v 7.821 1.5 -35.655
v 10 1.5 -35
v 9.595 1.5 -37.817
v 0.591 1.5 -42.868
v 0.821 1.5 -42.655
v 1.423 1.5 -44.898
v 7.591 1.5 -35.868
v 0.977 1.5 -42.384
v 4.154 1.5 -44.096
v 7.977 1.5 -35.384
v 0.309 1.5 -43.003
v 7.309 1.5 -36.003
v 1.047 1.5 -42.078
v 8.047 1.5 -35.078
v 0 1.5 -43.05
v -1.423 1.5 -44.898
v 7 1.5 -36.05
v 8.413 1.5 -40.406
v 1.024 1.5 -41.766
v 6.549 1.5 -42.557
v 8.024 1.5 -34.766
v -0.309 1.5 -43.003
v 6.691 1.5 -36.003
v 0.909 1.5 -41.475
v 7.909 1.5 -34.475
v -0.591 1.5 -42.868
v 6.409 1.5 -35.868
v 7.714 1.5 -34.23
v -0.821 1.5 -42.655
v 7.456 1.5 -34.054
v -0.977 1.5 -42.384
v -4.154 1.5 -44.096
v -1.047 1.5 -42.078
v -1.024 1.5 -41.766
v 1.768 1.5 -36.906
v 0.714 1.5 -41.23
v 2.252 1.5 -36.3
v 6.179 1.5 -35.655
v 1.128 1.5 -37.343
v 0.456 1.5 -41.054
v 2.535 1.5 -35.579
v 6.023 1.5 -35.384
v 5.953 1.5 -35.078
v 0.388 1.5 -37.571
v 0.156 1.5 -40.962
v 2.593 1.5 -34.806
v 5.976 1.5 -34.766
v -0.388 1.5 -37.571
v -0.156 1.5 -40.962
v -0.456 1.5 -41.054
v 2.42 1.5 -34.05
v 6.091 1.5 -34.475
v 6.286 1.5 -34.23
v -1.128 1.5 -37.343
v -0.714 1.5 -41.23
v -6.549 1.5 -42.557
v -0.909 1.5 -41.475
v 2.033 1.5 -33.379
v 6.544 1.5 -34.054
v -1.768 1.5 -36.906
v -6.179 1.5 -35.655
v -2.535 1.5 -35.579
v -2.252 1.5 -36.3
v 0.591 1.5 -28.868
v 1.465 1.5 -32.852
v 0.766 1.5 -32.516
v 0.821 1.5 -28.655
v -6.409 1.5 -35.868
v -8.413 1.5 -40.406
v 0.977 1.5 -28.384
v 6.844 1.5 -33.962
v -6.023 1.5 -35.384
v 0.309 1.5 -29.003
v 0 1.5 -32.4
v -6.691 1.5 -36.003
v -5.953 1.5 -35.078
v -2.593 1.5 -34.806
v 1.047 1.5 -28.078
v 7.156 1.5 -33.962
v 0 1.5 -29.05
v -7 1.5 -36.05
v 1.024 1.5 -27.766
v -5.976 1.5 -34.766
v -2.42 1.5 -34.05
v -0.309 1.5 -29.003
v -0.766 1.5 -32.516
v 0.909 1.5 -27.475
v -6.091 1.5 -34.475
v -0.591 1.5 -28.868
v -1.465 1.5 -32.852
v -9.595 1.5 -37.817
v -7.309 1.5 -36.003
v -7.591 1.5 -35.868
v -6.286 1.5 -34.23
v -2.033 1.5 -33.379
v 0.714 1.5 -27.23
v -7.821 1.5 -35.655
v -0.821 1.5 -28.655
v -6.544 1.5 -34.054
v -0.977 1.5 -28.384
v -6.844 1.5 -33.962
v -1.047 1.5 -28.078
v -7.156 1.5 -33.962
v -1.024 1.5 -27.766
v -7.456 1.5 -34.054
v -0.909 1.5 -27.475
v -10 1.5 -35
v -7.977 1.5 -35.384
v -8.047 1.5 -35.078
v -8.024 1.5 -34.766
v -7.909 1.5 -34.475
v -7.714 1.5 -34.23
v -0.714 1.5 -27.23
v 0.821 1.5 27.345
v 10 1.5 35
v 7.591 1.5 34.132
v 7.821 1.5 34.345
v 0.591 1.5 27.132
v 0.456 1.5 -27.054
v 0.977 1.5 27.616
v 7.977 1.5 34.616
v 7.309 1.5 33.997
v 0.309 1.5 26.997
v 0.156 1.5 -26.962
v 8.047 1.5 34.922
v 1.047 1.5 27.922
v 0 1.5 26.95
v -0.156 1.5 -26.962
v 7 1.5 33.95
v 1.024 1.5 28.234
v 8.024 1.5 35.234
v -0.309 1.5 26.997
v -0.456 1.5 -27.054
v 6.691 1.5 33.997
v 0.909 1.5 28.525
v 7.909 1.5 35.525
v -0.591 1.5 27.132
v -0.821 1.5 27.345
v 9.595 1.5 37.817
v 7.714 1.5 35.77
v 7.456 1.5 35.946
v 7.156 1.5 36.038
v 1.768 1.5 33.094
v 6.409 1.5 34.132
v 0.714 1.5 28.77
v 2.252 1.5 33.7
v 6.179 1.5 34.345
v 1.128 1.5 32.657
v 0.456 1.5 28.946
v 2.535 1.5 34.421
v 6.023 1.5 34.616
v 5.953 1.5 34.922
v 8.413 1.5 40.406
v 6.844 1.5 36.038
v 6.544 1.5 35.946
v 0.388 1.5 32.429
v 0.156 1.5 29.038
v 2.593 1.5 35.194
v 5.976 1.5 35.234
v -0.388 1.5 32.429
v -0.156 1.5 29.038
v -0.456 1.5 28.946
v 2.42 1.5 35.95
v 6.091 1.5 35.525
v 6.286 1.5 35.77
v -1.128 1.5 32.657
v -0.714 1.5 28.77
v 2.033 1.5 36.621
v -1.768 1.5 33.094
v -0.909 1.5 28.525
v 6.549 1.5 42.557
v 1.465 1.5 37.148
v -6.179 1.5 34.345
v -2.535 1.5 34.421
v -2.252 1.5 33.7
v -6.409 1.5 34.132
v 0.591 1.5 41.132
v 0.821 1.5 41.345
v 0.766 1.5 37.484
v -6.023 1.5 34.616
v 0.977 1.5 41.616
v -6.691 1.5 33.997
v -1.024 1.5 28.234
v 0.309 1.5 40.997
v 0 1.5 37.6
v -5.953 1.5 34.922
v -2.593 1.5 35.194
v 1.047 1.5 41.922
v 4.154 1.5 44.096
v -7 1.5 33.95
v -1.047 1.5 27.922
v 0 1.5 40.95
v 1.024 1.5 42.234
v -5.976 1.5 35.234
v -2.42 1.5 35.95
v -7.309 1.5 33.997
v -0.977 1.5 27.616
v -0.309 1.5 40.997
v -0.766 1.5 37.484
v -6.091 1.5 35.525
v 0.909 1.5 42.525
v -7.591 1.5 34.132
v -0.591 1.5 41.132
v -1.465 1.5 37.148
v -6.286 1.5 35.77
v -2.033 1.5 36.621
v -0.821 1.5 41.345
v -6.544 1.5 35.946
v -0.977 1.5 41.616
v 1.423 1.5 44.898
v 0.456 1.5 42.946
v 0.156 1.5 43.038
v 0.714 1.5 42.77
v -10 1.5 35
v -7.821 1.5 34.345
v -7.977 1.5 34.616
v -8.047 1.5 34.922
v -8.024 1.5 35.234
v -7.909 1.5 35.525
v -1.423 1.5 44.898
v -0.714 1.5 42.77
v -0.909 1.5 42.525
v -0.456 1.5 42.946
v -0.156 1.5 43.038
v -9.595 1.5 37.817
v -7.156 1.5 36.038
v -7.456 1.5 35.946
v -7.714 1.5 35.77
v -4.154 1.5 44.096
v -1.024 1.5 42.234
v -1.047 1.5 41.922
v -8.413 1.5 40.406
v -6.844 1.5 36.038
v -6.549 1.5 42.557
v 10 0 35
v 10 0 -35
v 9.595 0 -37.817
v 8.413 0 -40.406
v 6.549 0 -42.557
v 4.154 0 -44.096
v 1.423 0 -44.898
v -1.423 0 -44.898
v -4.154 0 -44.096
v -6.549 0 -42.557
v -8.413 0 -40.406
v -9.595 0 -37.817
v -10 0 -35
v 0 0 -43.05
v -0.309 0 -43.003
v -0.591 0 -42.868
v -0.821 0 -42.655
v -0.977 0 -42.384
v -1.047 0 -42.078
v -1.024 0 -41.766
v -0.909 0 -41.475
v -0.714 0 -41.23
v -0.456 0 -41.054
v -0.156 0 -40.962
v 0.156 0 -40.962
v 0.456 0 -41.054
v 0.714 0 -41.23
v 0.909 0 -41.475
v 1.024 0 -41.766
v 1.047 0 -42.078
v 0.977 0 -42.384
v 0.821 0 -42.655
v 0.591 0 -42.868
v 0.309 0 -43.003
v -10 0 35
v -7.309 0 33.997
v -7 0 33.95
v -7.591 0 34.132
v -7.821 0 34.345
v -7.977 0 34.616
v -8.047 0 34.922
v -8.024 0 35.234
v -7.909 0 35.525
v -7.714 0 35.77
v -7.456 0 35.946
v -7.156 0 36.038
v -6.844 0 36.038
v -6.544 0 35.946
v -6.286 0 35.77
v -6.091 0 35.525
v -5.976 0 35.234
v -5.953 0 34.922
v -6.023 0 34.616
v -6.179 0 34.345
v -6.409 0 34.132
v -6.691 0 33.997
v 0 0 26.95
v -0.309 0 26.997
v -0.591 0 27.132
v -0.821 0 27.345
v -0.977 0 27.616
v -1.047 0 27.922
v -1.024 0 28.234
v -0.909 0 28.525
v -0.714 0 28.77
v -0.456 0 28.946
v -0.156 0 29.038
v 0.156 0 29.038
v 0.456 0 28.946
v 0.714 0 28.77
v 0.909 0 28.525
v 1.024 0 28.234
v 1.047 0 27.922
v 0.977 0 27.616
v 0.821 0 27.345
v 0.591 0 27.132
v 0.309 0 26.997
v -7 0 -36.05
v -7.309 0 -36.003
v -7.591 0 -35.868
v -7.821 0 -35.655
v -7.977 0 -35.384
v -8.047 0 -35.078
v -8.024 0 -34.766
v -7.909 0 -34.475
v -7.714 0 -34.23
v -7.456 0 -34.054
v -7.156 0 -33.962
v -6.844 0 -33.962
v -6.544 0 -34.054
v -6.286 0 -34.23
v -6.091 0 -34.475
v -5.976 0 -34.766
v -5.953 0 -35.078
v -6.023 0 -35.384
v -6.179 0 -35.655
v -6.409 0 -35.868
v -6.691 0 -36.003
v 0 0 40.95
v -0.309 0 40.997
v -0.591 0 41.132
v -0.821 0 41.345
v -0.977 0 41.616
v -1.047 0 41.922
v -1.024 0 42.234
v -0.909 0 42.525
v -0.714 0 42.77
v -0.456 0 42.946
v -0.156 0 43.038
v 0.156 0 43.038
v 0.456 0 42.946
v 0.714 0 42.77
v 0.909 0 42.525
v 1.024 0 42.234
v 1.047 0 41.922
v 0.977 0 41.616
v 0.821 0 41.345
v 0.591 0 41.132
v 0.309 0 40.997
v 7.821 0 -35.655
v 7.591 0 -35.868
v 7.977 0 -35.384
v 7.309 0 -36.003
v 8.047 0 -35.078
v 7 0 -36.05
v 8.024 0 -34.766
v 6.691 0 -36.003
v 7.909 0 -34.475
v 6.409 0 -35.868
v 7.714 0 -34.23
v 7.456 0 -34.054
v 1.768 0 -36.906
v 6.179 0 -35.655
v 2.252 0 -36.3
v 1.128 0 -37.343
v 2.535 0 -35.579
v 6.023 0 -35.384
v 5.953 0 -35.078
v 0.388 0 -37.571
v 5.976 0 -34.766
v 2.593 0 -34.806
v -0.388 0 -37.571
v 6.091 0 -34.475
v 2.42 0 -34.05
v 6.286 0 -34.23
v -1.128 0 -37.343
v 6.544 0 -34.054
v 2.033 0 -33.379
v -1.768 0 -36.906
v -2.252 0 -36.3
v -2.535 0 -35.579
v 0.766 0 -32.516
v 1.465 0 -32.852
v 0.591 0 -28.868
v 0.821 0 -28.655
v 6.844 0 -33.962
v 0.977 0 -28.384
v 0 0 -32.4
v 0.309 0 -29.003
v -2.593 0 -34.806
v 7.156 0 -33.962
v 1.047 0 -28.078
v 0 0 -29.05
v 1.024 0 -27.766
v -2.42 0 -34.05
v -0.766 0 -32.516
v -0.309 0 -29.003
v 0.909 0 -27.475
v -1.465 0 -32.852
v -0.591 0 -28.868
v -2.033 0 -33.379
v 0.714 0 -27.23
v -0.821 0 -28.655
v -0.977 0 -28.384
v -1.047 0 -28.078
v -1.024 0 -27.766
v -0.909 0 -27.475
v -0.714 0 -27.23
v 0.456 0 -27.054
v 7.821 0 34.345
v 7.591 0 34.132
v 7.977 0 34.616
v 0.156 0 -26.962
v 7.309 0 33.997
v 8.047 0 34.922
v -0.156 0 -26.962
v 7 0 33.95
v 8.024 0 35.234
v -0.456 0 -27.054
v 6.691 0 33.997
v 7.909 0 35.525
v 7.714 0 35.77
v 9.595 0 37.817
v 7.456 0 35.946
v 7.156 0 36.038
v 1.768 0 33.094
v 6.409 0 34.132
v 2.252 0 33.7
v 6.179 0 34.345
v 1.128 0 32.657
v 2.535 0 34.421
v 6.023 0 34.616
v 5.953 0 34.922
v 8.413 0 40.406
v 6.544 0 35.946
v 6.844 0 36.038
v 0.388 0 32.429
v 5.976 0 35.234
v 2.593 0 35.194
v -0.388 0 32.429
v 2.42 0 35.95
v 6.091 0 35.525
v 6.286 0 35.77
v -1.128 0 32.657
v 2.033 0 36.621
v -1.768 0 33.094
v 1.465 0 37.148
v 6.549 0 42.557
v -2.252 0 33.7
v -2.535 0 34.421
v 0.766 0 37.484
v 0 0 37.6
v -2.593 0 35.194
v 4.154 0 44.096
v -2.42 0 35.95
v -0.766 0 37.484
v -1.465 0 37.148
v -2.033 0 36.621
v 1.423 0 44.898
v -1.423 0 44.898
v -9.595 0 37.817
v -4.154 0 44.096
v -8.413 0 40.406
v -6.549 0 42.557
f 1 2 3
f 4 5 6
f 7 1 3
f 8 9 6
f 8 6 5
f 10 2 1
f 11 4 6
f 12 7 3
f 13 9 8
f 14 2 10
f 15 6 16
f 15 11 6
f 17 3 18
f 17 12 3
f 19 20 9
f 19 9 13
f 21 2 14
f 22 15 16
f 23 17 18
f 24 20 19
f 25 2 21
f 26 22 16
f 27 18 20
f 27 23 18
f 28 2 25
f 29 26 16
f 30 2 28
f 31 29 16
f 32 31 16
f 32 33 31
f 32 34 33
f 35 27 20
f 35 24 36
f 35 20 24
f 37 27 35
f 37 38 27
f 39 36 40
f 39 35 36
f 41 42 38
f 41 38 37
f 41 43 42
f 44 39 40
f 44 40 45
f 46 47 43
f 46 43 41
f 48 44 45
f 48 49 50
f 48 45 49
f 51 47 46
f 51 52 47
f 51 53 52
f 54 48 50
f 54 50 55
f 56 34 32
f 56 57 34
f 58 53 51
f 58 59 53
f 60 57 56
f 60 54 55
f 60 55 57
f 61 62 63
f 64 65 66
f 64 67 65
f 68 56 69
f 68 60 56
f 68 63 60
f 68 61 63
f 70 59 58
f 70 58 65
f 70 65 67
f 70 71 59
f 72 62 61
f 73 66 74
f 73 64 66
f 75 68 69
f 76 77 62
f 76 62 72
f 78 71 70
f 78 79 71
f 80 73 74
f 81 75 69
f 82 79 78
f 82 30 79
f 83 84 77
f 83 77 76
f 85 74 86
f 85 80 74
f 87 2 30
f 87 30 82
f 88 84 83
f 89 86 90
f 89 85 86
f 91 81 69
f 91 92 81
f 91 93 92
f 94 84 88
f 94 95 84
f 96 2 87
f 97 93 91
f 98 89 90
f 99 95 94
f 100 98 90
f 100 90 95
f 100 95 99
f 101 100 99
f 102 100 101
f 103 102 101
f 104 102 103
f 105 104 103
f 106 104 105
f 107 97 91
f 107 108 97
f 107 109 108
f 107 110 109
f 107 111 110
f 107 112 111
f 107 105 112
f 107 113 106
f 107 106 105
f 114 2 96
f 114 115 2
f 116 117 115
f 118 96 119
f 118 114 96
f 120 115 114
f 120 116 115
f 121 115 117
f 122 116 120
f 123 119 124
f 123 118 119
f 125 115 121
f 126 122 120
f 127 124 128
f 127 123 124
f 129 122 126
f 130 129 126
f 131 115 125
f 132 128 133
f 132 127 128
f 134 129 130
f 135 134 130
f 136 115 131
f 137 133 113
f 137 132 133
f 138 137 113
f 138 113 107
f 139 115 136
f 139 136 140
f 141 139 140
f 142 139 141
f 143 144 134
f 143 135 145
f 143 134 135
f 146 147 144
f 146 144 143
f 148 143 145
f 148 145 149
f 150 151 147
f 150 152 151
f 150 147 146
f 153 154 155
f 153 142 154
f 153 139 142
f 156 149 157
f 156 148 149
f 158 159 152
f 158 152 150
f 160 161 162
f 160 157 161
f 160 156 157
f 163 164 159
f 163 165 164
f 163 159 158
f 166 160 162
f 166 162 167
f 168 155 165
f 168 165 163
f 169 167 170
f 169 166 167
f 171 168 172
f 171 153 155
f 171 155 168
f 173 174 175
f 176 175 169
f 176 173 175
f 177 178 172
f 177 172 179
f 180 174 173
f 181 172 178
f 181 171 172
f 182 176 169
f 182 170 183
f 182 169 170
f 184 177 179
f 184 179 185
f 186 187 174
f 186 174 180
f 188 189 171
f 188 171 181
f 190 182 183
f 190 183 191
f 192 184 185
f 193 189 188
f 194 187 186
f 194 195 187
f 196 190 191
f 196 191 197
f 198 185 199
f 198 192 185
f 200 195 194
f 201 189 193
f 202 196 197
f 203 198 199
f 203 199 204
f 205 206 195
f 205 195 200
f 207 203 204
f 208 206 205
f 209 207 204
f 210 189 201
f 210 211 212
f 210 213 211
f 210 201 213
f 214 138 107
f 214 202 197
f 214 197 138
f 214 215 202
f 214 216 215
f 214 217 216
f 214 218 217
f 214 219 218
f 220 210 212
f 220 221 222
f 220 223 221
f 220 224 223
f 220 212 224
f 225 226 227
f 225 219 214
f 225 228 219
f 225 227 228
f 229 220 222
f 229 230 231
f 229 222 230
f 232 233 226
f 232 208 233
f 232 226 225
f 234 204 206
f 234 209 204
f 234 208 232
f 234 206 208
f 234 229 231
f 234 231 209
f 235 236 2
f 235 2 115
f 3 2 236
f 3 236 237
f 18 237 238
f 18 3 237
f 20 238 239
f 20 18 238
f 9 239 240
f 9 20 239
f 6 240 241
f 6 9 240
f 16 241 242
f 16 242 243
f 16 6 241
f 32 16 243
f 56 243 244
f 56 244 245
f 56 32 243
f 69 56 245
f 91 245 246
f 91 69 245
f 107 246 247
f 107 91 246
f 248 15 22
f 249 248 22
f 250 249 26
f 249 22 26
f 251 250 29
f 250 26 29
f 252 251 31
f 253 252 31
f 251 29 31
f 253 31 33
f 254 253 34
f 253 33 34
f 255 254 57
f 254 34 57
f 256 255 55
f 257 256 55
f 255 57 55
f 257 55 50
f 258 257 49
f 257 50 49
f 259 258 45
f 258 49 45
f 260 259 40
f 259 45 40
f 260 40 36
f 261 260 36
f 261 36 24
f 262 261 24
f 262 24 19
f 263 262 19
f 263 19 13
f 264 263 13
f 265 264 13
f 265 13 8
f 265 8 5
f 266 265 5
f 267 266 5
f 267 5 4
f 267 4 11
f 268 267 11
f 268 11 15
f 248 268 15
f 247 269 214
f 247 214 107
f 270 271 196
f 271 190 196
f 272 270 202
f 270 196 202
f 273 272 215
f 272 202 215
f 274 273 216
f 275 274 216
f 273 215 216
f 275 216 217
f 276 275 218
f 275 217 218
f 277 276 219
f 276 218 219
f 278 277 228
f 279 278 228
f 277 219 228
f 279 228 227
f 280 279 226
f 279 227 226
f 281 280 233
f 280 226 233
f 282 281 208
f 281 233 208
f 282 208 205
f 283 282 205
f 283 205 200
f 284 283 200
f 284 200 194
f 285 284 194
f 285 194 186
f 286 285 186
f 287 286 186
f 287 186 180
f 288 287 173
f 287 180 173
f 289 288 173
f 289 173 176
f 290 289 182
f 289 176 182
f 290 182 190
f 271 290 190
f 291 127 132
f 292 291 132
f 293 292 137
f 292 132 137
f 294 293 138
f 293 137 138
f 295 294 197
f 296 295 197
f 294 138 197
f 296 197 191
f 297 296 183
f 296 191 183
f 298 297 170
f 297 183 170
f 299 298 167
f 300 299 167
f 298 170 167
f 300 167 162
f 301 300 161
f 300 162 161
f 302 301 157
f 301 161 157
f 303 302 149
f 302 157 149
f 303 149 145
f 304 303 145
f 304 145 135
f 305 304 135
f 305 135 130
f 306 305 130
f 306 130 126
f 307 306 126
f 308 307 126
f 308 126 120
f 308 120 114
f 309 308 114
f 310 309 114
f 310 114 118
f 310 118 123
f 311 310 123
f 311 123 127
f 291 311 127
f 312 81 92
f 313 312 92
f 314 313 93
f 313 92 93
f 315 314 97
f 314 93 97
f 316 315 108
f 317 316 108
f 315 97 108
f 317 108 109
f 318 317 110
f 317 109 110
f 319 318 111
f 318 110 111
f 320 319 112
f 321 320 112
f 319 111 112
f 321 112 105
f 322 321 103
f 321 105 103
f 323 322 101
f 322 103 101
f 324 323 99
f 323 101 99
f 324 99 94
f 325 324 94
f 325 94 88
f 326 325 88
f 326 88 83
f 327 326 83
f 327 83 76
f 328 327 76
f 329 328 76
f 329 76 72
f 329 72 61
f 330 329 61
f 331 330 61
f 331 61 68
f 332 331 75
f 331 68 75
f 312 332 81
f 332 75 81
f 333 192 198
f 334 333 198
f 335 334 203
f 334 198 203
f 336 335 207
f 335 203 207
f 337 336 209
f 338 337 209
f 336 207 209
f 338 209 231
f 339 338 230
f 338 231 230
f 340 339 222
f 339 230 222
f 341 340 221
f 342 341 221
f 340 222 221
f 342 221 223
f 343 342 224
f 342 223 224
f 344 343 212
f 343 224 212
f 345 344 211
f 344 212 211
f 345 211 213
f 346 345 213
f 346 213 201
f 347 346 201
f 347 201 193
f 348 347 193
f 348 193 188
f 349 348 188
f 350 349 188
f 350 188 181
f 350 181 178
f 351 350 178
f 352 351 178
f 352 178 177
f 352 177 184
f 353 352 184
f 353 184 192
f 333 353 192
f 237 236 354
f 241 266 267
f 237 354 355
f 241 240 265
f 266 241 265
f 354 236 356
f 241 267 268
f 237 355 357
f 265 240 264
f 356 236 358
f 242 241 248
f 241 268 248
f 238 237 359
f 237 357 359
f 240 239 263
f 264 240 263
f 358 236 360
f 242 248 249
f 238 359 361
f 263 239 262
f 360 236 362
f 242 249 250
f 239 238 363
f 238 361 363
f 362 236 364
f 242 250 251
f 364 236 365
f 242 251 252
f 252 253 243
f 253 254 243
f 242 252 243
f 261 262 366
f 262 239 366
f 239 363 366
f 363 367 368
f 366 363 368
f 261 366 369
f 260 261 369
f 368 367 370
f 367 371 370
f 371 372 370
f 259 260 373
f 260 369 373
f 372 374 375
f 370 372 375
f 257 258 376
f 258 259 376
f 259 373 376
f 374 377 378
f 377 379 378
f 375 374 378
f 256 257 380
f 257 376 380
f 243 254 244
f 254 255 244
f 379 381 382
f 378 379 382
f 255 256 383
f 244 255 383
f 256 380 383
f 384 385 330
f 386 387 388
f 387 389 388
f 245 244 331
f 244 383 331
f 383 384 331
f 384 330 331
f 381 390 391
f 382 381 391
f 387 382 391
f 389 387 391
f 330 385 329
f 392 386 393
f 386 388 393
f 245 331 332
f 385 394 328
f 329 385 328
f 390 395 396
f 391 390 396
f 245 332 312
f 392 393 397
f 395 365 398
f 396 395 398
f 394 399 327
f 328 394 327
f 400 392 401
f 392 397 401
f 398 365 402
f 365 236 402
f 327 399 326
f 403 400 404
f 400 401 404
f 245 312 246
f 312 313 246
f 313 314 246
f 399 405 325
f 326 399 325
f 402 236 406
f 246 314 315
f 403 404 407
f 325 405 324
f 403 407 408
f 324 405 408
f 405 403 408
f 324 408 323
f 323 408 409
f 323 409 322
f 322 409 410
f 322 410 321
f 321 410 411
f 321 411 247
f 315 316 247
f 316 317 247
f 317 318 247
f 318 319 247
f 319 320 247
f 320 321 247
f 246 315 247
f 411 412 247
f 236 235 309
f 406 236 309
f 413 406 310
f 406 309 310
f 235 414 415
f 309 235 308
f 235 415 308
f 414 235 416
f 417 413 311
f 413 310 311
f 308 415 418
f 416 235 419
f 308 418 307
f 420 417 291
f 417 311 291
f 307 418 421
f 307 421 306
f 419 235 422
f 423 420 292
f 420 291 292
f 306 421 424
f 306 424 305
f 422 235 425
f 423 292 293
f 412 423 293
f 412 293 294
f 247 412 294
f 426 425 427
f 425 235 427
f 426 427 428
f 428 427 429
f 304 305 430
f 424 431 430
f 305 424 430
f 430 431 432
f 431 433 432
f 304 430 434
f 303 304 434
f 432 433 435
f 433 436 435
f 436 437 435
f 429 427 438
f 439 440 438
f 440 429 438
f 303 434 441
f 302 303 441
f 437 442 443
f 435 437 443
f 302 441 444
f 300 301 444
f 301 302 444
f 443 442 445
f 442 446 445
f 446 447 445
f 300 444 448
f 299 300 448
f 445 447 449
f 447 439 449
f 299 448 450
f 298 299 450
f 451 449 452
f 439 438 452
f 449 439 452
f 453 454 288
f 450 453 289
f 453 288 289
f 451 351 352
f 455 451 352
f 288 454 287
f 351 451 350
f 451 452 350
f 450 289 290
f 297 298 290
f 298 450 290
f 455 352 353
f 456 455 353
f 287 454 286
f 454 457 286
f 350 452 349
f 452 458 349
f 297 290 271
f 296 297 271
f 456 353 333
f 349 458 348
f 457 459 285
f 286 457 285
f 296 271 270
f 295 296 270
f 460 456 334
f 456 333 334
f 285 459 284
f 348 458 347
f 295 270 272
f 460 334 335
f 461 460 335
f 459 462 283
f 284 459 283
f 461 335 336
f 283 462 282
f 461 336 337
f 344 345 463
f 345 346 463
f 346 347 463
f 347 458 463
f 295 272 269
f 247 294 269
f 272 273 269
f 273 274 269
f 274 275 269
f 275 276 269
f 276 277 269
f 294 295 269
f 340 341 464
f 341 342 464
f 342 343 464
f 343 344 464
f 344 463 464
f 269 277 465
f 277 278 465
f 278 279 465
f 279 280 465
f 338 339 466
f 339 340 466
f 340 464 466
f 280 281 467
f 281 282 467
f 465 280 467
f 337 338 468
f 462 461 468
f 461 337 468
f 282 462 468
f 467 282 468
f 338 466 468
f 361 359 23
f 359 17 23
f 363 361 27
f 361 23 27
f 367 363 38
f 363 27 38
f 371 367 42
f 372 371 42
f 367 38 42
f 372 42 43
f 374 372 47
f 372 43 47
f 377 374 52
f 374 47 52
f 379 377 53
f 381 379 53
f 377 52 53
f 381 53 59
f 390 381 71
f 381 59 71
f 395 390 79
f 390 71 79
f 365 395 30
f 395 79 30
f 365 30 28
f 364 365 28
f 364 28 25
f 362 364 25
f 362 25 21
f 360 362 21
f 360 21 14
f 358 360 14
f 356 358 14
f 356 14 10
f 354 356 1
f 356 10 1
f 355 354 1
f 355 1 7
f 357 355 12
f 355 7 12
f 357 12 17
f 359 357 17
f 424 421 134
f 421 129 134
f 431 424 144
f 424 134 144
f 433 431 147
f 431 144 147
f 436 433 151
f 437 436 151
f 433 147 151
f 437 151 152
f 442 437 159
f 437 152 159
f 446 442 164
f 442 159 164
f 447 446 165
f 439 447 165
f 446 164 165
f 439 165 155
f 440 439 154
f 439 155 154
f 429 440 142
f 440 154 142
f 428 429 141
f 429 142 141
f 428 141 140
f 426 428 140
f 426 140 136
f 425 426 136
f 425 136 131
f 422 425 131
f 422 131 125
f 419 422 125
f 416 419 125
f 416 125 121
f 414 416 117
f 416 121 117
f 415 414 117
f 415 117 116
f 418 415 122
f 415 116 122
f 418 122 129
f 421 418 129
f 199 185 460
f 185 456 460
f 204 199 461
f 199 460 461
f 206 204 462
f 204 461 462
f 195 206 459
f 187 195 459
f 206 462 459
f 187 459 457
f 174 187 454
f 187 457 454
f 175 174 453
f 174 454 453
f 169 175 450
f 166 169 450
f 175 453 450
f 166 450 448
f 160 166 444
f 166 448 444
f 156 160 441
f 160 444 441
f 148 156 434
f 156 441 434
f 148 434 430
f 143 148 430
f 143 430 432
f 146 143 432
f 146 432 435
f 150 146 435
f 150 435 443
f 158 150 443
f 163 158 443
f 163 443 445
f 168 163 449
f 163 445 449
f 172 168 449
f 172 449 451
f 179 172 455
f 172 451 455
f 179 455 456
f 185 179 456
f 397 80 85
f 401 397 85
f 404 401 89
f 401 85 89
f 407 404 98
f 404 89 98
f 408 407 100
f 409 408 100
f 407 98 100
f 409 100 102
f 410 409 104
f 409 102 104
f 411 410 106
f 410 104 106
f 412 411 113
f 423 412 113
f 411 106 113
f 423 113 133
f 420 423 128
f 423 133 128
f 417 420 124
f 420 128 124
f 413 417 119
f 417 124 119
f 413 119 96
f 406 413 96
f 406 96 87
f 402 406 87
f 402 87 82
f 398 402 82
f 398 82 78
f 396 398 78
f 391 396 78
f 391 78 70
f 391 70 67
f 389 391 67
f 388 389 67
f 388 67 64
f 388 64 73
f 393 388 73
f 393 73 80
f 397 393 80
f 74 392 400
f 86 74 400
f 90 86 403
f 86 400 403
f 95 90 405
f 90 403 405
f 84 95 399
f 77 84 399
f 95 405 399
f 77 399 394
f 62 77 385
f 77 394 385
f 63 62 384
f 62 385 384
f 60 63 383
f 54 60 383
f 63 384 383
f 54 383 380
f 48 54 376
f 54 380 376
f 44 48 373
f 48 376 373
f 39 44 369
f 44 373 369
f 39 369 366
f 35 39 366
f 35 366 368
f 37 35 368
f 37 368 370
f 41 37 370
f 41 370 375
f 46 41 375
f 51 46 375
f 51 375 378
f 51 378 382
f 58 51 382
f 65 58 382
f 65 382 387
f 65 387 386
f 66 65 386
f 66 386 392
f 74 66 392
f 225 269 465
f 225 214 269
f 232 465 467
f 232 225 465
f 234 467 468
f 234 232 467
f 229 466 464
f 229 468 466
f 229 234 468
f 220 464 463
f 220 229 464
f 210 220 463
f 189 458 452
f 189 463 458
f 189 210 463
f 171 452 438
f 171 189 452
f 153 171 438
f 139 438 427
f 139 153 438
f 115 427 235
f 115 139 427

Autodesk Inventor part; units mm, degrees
ref_plane "YZ Plane" through (0, 0, 0) normal (1, 0, 0) x (0, 1, 0)
ref_plane "XZ Plane" through (0, 0, 0) normal (0, 1, 0) x (-1, 0, 0)
ref_plane "XY Plane" through (0, 0, 0) normal (0, 0, 1) x (1, 0, 0)
sketch "Sketch1" plane through (0, 0, 0) normal (0, 1, 0) x (-1, 0, 0)
  line L0 (10, -45) -> (-10, -45)
  line L1 (-10, -45) -> (-10, 45)
  line L2 (-10, 45) -> (10, 45)
  line L3 (10, 45) -> (10, -45)
  point P0 (0, 0)
  dimension "d0" = 20
  dimension "d1" = 90
  dimension "d2" = 45
  dimension "d3" = 10
extrude "Plate1" add sketch "Sketch1" along normal blind 1.5
sketch "Sketch2" plane through (0, 0, 0) normal (0, -1, 0) x (1, 0, 0)
  circle A0 centre (0, 42) radius 0.7835 projected
  circle A1 centre (-7, 35) radius 0.7835 projected
  circle A2 centre (0, 28) radius 0.7835 projected
  circle A3 centre (7, 35) radius 0.7835 projected
  circle A4 centre (0, -28) radius 0.7835 projected
  circle A5 centre (-7, -35) radius 0.7835 projected
  circle A6 centre (0, -42) radius 0.7835 projected
  circle A7 centre (7, -35) radius 0.7835 projected
  point P0 (0, 0)
hole "Hole1" at (0, 0, 42) at (-7, 0, 35) at (0, 0, 28) at (7, 0, 35) at (0, 0, -28) at (-7, 0, -35) at (0, 0, -42) at (7, 0, -35) direction (0, 1, 0) diameter 2.1 depth 1.5
sketch "Sketch3" plane through (0, 1.5, 0) normal (0, 1, 0) x (1, 0, 0)
  arc A0 (10, 35) -> (-10, 35) centre (0, 35) ccw
  arc A1 (-10, -35) -> (10, -35) centre (0, -35) ccw
  line L0 (-10, 35) -> (-10, -35)
  line L1 (10, 35) -> (10, -35)
  line L2 (10, 45) -> (10, -45) projected
  line L3 (-10, 45) -> (10, 45)
  line L4 (10, 45) -> (10, -45)
  line L5 (10, -45) -> (-10, -45)
  line L6 (-10, -45) -> (-10, 45)
  point P0 (0, 0)
  point P1 (0, 45)
  point P2 (10, 35)
  point P3 (-10, -35)
  point P4 (0, -45)
  point P5 (10, -35)
  dimension "d12" = 35
  dimension "d13" = 35
  dimension "d14" = 10
  dimension "d15" = 10
  dimension "d16" = 10
  dimension "d17" = 20
  dimension "d18" = 90
extrude "Extrusion1" cut sketch "Sketch3" against normal blind 10 contours A0 L3 L2 | A0 L6 L3 | L2 L5 A1 | L5 L6 A1
sketch "Sketch4" plane through (0, 1.5, 0) normal (0, 1, 0) x (1, 0, 0)
  arc A0 (10, 35) -> (-10, 35) centre (0, 35) ccw projected
  arc A1 (-10, -35) -> (10, -35) centre (0, -35) ccw projected
  point P0 (0, 0)
hole "Hole2" at (0, 1.5, -35) at (0, 1.5, 35) direction (0, -1, 0) diameter 5.2 depth 1.5 clearance for "Hex Head Bolt" size "M5" standard "Ansi Metric M Profile"
equation "\"d10\" = Thickness"
equation "\"d26\" = Thickness"
equation "\"d4\" = Thickness"
equation "\"BendReliefWidth\" = Thickness"
equation "\"BendReliefDepth\" = 0.5 * Thickness"
equation "\"CornerReliefSize\" = 4 * Thickness"
equation "\"MinimumRemnant\" = 2 * Thickness"
equation "\"TransitionRadius\" = BendRadius"
equation "\"JacobiRadiusSize\" = BendRadius"
equation "\"GapSize\" = Thickness"
equation "\"Thickness\" = 1.5"
equation "\"BendRadius\" = 0.31"
properties part number "axis_10_11-connector_frame" material "Aluminum 6061-AHC"
